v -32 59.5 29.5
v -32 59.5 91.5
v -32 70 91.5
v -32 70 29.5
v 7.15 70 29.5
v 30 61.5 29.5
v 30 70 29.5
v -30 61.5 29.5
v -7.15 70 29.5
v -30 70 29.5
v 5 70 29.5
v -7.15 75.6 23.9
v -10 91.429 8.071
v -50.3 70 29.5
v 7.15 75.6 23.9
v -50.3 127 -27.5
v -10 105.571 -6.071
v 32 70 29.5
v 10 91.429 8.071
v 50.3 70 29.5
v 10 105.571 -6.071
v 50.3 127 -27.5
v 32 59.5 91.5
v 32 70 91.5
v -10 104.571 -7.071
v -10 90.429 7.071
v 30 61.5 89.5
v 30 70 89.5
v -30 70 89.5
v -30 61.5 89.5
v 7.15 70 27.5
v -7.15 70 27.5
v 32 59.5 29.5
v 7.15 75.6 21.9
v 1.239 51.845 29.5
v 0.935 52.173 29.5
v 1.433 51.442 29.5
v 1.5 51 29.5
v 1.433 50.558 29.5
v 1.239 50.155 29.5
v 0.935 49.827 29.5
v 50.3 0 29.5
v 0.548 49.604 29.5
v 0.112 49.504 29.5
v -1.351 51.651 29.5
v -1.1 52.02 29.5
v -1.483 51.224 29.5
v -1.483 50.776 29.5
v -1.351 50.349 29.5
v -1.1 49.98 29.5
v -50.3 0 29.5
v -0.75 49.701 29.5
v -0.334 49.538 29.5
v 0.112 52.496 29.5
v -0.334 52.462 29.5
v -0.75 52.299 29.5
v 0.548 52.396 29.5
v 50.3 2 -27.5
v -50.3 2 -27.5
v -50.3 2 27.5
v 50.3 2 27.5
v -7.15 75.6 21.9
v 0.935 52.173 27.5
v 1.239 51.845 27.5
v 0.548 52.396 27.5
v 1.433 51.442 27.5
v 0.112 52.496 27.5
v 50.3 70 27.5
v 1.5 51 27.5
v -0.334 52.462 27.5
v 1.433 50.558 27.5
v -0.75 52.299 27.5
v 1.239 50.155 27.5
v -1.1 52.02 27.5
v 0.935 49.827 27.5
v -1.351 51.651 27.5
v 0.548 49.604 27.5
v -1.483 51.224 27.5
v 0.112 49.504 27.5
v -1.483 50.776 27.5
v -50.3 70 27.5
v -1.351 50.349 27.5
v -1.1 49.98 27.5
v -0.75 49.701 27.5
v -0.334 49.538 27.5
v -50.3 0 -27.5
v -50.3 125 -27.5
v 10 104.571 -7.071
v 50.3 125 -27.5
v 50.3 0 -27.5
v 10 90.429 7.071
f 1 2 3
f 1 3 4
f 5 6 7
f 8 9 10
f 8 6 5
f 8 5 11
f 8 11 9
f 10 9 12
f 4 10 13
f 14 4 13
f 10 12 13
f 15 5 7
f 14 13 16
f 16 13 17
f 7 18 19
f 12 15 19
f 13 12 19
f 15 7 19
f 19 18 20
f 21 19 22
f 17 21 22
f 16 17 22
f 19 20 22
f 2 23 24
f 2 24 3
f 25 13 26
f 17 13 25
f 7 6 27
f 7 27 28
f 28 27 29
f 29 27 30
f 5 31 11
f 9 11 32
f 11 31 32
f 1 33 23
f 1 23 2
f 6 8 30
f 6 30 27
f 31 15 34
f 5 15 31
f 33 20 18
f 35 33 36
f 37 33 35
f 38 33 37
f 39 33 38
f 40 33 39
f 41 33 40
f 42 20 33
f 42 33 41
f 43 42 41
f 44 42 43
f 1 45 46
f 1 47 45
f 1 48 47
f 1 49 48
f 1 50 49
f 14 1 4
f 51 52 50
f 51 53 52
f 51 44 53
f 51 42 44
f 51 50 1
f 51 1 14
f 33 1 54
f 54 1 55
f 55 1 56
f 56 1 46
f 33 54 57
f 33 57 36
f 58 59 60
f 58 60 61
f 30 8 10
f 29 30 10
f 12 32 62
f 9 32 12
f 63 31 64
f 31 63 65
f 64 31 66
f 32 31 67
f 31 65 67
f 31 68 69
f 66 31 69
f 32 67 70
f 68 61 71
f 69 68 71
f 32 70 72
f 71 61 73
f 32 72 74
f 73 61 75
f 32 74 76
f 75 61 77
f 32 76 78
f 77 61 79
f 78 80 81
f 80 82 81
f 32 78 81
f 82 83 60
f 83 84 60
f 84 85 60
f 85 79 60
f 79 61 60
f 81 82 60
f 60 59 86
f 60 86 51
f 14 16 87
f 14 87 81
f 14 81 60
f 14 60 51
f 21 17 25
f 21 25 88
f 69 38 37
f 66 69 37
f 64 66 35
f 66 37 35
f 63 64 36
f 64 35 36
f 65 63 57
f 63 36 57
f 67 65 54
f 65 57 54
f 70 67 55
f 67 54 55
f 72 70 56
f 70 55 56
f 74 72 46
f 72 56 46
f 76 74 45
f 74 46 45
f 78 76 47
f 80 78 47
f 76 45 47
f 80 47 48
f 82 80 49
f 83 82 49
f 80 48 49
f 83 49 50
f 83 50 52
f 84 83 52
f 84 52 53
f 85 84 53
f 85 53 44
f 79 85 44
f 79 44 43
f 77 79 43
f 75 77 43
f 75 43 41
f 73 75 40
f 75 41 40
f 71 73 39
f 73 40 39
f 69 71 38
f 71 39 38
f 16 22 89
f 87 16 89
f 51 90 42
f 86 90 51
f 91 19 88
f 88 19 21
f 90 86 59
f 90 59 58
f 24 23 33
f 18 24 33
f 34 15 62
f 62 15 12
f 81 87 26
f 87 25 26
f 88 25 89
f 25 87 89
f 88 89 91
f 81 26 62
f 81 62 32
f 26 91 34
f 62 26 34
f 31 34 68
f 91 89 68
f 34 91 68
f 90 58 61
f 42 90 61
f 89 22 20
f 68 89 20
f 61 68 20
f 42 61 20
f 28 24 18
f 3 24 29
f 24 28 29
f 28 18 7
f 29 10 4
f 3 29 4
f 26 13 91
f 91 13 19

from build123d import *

# Parameters (mm, degrees)
CROQUIS1_W              = 100.6
CROQUIS1_H              = 55
SALIENTE_EXTRUIR1_DEPTH = 2
CROQUIS2_W              = 100.6
CROQUIS2_H              = 2
SALIENTE_EXTRUIR2_DEPTH = 70
SALIENTE_EXTRUIR3_DEPTH = 100.6
CROQUIS4_W              = 10
CROQUIS4_H              = 5.6
CROQUIS4_W_2            = 20
CROQUIS4_H_2            = 20
CORTAR_EXTRUIR1_DEPTH   = 1.414213562
CROQUIS5_R              = 1.5
CORTAR_EXTRUIR2_DEPTH   = 2
CROQUIS6_W              = 60
CROQUIS6_H              = 2
SALIENTE_EXTRUIR4_DEPTH = 60
SALIENTE_EXTRUIR5_REACH = 181.856
CROQUIS7_W              = 2
CROQUIS7_H              = 10.5
CROQUIS8_W              = 64
CROQUIS8_H              = 2
SALIENTE_EXTRUIR6_DEPTH = 10.5
CROQUIS9_W              = 10
CROQUIS9_H              = 2
SALIENTE_EXTRUIR7_DEPTH = 2
CROQUIS10_W             = 10
CROQUIS10_H             = 5.6
CORTAR_EXTRUIR3_DEPTH   = 11
CORTAR_EXTRUIR4_DEPTH   = 10


with BuildPart() as part:
    # Croquis1 → Saliente-Extruir1 (new body)
    with BuildSketch(Plane(origin=(0, 0, 0), x_dir=(1, 0, 0), z_dir=(0, 1, 0))):
        Rectangle(CROQUIS1_W, CROQUIS1_H)
    extrude(amount=SALIENTE_EXTRUIR1_DEPTH)

    # Croquis2 → Saliente-Extruir2 (add)
    with BuildSketch(Plane(origin=(0, 0, 0), x_dir=(-1, 0, 0), z_dir=(0, -1, 0))):
        with Locations((0, -28.5)):
            Rectangle(CROQUIS2_W, CROQUIS2_H)
    extrude(amount=-SALIENTE_EXTRUIR2_DEPTH)

    # Croquis3 → Saliente-Extruir3 (add)
    with BuildSketch(Plane(origin=(50.3, 0, 0), x_dir=(0, 0, -1), z_dir=(1, 0, 0))):
        Polygon((-29.5, 70), (27.5, 127), (27.5, 125), (-27.5, 70), align=None)
    extrude(amount=-SALIENTE_EXTRUIR3_DEPTH)

    # Croquis4 → Cortar-Extruir1 (cut)
    with BuildSketch(Plane(origin=(0, 49.75, 49.75), x_dir=(1, 0, 0), z_dir=(0, 0.7071067811865513, 0.7071067811865438))):
        with Locations((0, 31.437824638)):
            Rectangle(CROQUIS4_W, CROQUIS4_H)
        with Locations((0, 68.942911166)):
            Rectangle(CROQUIS4_W_2, CROQUIS4_H_2)
    extrude(amount=-CORTAR_EXTRUIR1_DEPTH, mode=Mode.SUBTRACT)

    # Croquis5 → Cortar-Extruir2 (cut)
    with BuildSketch(Plane.XY.offset(29.5)):
        with Locations((0, 51)):
            Circle(CROQUIS5_R)
    extrude(amount=-CORTAR_EXTRUIR2_DEPTH, mode=Mode.SUBTRACT)

    # Croquis6 → Saliente-Extruir4 (add)
    with BuildSketch(Plane.XY.offset(29.5)):
        with Locations((0, 60.5)):
            Rectangle(CROQUIS6_W, CROQUIS6_H)
    extrude(amount=SALIENTE_EXTRUIR4_DEPTH)

    # Saliente-Extruir5: up to this face of the body (flat: up to its plane)
    saliente_extruir5_end = Plane(part.part.faces().sort_by_distance((0, 34.541123817, 29.5))[0])
    # Croquis7 → Saliente-Extruir5 (add, up to the picked face)
    with BuildSketch(Plane.XY.offset(89.5), mode=Mode.PRIVATE) as saliente_extruir5_sk1:
        with Locations((31, 64.75)):
            Rectangle(CROQUIS7_W, CROQUIS7_H)
    saliente_extruir5_tool1 = split(extrude(saliente_extruir5_sk1.sketch, amount=-SALIENTE_EXTRUIR5_REACH, mode=Mode.PRIVATE), bisect_by=saliente_extruir5_end, keep=Keep.BOTH, mode=Mode.PRIVATE)
    # Croquis7 → Saliente-Extruir5 (add, up to the picked face)
    with BuildSketch(Plane.XY.offset(89.5), mode=Mode.PRIVATE) as saliente_extruir5_sk2:
        with Locations((-31, 64.75)):
            Rectangle(CROQUIS7_W, CROQUIS7_H)
    saliente_extruir5_tool2 = split(extrude(saliente_extruir5_sk2.sketch, amount=-SALIENTE_EXTRUIR5_REACH, mode=Mode.PRIVATE), bisect_by=saliente_extruir5_end, keep=Keep.BOTH, mode=Mode.PRIVATE)
    add(saliente_extruir5_tool1.solids().sort_by(Axis((31, 64.75, 89.5), (0, 0, -1)))[0])
    add(saliente_extruir5_tool2.solids().sort_by(Axis((-31, 64.75, 89.5), (0, 0, -1)))[0])

    # Croquis8 → Saliente-Extruir6 (add)
    with BuildSketch(Plane(origin=(0, 59.5, 0), x_dir=(-1, 0, 0), z_dir=(0, -1, 0))):
        with Locations((0, -90.5)):
            Rectangle(CROQUIS8_W, CROQUIS8_H)
    extrude(amount=-SALIENTE_EXTRUIR6_DEPTH)

    # Croquis9 → Saliente-Extruir7 (add)
    with BuildSketch(Plane(origin=(0, 0, 27.5), x_dir=(-1, 0, 0), z_dir=(0, 0, -1))):
        with Locations((0, 69)):
            Rectangle(CROQUIS9_W, CROQUIS9_H)
    extrude(amount=-SALIENTE_EXTRUIR7_DEPTH)

    # Croquis10 → Cortar-Extruir3 (cut)
    with BuildSketch(Plane.XY.offset(29.5)):
        with Locations((0, 72.8)):
            Rectangle(CROQUIS10_W, CROQUIS10_H)
    extrude(amount=-CORTAR_EXTRUIR3_DEPTH, mode=Mode.SUBTRACT)

    # Croquis11 → Cortar-Extruir4 (cut)
    with BuildSketch(Plane.XY.offset(29.5)):
        Polygon((0, 75.6), (7.15, 75.6), (7.15, 70), (-7.15, 70), (-7.15, 75.6), align=None)
    extrude(amount=-CORTAR_EXTRUIR4_DEPTH, mode=Mode.SUBTRACT)


solid = part.part
